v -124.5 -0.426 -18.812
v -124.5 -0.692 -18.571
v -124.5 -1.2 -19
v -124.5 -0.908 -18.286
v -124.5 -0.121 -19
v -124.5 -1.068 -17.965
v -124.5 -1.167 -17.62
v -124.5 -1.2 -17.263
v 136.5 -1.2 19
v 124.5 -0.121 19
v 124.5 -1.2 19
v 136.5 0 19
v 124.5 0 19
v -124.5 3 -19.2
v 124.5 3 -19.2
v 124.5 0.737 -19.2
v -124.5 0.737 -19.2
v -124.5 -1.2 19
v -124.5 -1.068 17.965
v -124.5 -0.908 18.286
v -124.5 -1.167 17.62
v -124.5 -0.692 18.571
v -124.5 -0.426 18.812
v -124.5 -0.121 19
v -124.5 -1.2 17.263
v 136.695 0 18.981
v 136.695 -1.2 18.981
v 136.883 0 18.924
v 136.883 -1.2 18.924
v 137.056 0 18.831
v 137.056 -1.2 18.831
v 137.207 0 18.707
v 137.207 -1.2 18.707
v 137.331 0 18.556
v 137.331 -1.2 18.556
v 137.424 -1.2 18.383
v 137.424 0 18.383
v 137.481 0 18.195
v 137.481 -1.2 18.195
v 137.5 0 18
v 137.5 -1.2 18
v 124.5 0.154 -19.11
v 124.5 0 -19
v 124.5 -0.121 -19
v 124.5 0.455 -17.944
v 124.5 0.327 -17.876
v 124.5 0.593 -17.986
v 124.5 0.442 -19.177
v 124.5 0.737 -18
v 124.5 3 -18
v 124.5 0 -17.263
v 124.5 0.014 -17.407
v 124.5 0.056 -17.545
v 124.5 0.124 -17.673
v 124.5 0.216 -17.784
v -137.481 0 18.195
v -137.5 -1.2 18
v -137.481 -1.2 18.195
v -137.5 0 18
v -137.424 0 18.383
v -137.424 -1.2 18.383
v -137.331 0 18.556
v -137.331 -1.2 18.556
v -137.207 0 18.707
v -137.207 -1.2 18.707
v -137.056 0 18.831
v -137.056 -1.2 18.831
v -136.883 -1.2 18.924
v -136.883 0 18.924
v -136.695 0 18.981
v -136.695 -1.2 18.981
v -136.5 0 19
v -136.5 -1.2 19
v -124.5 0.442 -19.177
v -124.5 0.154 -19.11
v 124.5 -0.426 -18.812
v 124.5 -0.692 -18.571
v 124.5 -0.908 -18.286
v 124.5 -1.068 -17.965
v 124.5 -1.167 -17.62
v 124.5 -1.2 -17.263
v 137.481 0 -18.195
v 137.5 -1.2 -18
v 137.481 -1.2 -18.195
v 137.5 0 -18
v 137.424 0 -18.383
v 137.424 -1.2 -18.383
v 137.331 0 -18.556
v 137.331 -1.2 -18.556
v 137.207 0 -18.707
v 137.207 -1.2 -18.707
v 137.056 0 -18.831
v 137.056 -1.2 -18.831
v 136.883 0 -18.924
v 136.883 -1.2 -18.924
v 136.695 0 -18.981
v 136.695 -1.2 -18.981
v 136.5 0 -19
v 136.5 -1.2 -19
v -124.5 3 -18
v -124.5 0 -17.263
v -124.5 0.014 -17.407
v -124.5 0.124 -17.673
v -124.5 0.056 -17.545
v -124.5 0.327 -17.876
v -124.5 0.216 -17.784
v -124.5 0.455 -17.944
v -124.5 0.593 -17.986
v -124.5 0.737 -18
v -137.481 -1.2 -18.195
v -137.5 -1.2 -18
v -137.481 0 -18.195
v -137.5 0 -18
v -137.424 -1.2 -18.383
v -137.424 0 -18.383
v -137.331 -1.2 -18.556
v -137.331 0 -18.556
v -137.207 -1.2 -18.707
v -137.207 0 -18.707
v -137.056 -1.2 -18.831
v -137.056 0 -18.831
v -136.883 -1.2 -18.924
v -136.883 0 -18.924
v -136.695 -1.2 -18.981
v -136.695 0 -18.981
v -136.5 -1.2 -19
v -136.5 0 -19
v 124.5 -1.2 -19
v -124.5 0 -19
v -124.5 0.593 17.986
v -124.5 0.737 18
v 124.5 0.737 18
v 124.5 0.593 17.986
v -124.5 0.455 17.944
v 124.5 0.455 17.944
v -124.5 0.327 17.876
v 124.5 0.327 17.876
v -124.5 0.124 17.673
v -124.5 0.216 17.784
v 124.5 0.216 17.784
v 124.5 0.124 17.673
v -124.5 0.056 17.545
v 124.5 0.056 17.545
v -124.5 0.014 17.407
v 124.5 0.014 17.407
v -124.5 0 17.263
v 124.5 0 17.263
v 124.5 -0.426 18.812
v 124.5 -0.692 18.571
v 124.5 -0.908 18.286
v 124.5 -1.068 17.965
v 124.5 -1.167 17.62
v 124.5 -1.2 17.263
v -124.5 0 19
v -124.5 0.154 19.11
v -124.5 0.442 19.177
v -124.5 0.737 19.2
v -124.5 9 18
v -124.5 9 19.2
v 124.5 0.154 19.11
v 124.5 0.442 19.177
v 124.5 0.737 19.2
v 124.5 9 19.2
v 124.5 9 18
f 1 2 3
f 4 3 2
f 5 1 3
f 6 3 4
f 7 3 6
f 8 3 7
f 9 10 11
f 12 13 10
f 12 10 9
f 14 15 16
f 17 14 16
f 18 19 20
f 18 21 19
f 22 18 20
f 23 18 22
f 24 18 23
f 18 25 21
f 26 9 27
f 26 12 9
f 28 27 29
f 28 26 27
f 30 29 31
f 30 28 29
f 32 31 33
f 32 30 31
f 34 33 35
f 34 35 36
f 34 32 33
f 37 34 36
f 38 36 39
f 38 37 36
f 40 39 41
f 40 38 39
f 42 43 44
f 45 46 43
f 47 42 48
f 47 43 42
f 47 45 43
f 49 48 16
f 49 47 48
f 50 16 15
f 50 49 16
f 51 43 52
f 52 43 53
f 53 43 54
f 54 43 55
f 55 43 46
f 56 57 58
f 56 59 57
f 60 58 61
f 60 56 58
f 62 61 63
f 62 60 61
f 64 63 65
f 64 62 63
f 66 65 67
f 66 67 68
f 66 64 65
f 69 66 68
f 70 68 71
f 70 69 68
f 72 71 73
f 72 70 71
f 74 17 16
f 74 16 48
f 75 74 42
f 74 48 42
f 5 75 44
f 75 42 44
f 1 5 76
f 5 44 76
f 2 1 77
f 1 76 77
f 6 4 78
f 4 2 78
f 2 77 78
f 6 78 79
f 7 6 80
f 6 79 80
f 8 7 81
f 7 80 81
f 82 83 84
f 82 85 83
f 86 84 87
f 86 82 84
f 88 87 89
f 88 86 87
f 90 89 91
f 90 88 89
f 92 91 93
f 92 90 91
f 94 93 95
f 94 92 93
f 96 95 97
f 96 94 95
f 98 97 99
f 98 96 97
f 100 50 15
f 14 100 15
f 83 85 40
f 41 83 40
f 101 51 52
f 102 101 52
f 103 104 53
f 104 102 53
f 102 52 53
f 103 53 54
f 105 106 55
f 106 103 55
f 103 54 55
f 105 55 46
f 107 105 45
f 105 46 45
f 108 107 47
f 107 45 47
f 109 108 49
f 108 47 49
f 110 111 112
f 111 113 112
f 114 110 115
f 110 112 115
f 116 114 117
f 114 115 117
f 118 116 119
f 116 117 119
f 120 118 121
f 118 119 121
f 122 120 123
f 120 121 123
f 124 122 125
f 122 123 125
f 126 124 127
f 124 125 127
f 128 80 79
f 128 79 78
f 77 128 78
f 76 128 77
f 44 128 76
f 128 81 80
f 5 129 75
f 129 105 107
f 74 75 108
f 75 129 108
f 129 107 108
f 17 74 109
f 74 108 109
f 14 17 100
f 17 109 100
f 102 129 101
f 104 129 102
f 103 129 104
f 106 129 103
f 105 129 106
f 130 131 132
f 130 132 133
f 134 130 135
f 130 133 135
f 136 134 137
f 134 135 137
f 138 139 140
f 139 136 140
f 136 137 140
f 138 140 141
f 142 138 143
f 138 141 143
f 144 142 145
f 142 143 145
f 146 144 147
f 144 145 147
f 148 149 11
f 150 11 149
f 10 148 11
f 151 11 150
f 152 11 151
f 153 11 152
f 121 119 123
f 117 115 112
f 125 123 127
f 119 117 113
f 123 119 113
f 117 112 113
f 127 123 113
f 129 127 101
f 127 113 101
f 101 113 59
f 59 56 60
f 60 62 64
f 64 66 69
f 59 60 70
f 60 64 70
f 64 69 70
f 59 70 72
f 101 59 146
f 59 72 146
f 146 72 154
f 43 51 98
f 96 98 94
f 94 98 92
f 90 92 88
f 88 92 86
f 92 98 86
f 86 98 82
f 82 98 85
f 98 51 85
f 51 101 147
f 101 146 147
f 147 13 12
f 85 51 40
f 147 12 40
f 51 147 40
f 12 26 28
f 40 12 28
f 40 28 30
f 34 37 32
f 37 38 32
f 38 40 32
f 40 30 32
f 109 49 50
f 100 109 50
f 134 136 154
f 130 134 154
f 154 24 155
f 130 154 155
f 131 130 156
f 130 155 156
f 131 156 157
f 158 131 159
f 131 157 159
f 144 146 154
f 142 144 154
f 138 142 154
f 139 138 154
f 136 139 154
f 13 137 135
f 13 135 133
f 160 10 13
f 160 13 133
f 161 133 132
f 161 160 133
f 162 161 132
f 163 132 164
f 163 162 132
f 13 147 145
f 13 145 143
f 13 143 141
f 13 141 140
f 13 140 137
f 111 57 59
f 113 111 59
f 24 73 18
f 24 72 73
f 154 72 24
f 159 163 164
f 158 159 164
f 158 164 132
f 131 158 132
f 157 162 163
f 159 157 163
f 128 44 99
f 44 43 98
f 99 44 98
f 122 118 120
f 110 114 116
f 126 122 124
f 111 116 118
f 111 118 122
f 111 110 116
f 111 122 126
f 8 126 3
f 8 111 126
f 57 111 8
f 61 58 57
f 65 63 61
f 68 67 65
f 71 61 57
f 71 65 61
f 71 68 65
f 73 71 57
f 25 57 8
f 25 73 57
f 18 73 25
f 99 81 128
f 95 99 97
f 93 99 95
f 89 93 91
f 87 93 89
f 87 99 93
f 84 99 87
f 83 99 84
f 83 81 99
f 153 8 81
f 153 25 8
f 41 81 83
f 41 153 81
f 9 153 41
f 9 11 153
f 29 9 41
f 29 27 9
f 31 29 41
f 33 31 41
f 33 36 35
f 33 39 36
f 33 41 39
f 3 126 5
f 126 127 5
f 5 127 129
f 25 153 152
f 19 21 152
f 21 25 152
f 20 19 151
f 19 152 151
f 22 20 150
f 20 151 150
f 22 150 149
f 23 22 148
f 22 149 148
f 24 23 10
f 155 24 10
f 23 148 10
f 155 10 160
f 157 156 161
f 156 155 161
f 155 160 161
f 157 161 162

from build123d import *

# Parameters (mm, degrees)
FLANGE_BASE2_DEPTH       = 137.5
CORTE_EXTRUS_O3_START    = -137.5
CORTE_EXTRUS_O3_DEPTH    = 13
CORTE_EXTRUS_O3_START_2  = 124.5
CORTE_EXTRUS_O3_2_DEPTH  = 13
ESBO_O12_W               = 13
ESBO_O12_H               = 1.2
RESSALTO_EXTRUS_O1_DEPTH = 19
FILETE1_R                = 1


# Read off the part's stored shape, not the designer's step: Corte-extrusão3
# Sheet-metal steps are written as plain solids
with BuildPart() as part:
    # Esboço1 → Flange-base2 (new, symmetric)
    with BuildSketch(Plane(origin=(0, 0, 0), x_dir=(0, 0, -1), z_dir=(1, 0, 0))):
        with BuildLine():
            Line((-18, 9), (-18, 0.7366))
            ThreePointArc((-18, 0.7366), (-17.784254855, 0.215745145), (-17.2634, 0))
            Line((-17.2634, 0), (17.2634, 0))
            ThreePointArc((17.2634, 0), (17.784254855, 0.215745145), (18, 0.7366))
            Line((18, 0.7366), (18, 3))
            Line((18, 3), (19.2, 3))
            Line((19.2, 3), (19.2, 0.7366))
            ThreePointArc((19.2, 0.7366), (18.632782992, -0.632782992), (17.2634, -1.2))
            Line((17.2634, -1.2), (-17.2634, -1.2))
            ThreePointArc((-17.2634, -1.2), (-18.632782992, -0.632782992), (-19.2, 0.7366))
            Line((-19.2, 0.7366), (-19.2, 9))
            Line((-19.2, 9), (-18, 9))
        make_face()
    extrude(amount=FLANGE_BASE2_DEPTH, both=True)

    # Corte-extrusão3 outline → Corte-extrusão3 (cut)
    with BuildSketch(Plane.YZ.offset(CORTE_EXTRUS_O3_START)):
        with BuildLine():
            Line((-1.2, 17.2634), (0, 17.2634))
            ThreePointArc((0, 17.2634), (0.215745145, 17.784254855), (0.7366, 18))
            Line((0.7366, 18), (9, 18))
            Line((9, 18), (9, 19.2))
            Line((9, 19.2), (0.7366, 19.2))
            ThreePointArc((0.7366, 19.2), (-0.632782992, 18.632782992), (-1.2, 17.2634))
        make_face()
        with BuildLine():
            ThreePointArc((0.7366, -18), (0.215745145, -17.784254855), (0, -17.2634))
            Line((0, -17.2634), (-1.2, -17.2634))
            ThreePointArc((-1.2, -17.2634), (-0.632782992, -18.632782992), (0.7366, -19.2))
            Line((0.7366, -19.2), (3, -19.2))
            Line((3, -19.2), (3, -18))
            Line((3, -18), (0.7366, -18))
        make_face()
    extrude(amount=CORTE_EXTRUS_O3_DEPTH, mode=Mode.SUBTRACT)

    # Corte-extrus_o3 2 outline → Corte-extrus_o3 2 (cut)
    with BuildSketch(Plane.YZ.offset(CORTE_EXTRUS_O3_START_2)):
        with BuildLine():
            Line((-1.2, 17.2634), (0, 17.2634))
            ThreePointArc((0, 17.2634), (0.215745145, 17.784254855), (0.7366, 18))
            Line((0.7366, 18), (9, 18))
            Line((9, 18), (9, 19.2))
            Line((9, 19.2), (0.7366, 19.2))
            ThreePointArc((0.7366, 19.2), (-0.632782992, 18.632782992), (-1.2, 17.2634))
        make_face()
        with BuildLine():
            ThreePointArc((0.7366, -18), (0.215745145, -17.784254855), (0, -17.2634))
            Line((0, -17.2634), (-1.2, -17.2634))
            ThreePointArc((-1.2, -17.2634), (-0.632782992, -18.632782992), (0.7366, -19.2))
            Line((0.7366, -19.2), (3, -19.2))
            Line((3, -19.2), (3, -18))
            Line((3, -18), (0.7366, -18))
        make_face()
    extrude(amount=CORTE_EXTRUS_O3_2_DEPTH, mode=Mode.SUBTRACT)

    # Esboço12 → Ressalto-extrusão1 (add, symmetric)
    with BuildSketch(Plane.XY):
        with Locations((131, -0.6)):
            Rectangle(ESBO_O12_W, ESBO_O12_H)
        with Locations((-131, -0.6)):
            Rectangle(ESBO_O12_W, ESBO_O12_H)
    extrude(amount=RESSALTO_EXTRUS_O1_DEPTH, both=True)

    # Filete1
    filete1_edges = [part.edges().sort_by_distance(p)[0] for p in [
        (137.5, -0.6, -19),
        (137.5, -0.6, 19),
        (-137.5, -0.6, -19),
        (-137.5, -0.6, 19),
    ]]
    fillet(filete1_edges, radius=FILETE1_R)


solid = part.part
